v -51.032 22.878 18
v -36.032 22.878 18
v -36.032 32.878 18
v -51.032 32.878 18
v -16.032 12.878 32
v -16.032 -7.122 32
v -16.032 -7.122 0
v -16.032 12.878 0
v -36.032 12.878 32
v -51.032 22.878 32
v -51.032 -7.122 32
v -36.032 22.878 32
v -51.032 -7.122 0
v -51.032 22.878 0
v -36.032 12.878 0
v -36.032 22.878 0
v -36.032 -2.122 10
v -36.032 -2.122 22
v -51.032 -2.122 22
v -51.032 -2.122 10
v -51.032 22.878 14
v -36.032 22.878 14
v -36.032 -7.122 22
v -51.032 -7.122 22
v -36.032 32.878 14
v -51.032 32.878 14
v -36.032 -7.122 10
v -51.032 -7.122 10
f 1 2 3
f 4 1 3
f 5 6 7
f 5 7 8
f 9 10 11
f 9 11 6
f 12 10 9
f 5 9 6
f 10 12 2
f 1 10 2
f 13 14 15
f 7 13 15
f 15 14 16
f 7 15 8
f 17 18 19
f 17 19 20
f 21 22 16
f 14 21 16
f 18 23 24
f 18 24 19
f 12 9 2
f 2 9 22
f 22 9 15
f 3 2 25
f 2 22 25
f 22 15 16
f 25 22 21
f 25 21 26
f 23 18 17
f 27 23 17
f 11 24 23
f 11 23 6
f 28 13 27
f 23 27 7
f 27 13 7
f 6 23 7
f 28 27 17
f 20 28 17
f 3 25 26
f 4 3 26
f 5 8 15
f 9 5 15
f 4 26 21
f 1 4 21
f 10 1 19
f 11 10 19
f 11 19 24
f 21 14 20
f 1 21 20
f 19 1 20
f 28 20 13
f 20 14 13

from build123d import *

# Parameters (mm, degrees)
BOSS_EXTRUDE1_DEPTH = 32
SKETCH2_W           = 14
SKETCH2_H           = 10
SKETCH2_W_2         = 12
CUT_EXTRUDE1_DEPTH  = 51.049529889


with BuildPart() as part:
    # Sketch1 → Boss-Extrude1 (new body)
    with BuildSketch(Plane.XY):
        Polygon((-36.032249566, 32.877886825), (-51.032249566, 32.877886825), (-51.032249566, -7.122113175), (-16.032249566, -7.122113175), (-16.032249566, 12.877886825), (-36.032249566, 12.877886825), align=None)
    extrude(amount=BOSS_EXTRUDE1_DEPTH)

    # Sketch2 → Cut-Extrude1 (cut, through all)
    with BuildSketch(Plane(origin=(-36.032249566, 0, 0), x_dir=(0, 0, -1), z_dir=(1, 0, 0))):
        with Locations((-7, 27.877886825)):
            Rectangle(SKETCH2_W, SKETCH2_H)
        with Locations((-25, 27.877886825)):
            Rectangle(SKETCH2_W, SKETCH2_H)
        with Locations((-16, -7.122113175)):
            Rectangle(SKETCH2_W_2, SKETCH2_H)
    extrude(amount=-CUT_EXTRUDE1_DEPTH, mode=Mode.SUBTRACT)


solid = part.part
